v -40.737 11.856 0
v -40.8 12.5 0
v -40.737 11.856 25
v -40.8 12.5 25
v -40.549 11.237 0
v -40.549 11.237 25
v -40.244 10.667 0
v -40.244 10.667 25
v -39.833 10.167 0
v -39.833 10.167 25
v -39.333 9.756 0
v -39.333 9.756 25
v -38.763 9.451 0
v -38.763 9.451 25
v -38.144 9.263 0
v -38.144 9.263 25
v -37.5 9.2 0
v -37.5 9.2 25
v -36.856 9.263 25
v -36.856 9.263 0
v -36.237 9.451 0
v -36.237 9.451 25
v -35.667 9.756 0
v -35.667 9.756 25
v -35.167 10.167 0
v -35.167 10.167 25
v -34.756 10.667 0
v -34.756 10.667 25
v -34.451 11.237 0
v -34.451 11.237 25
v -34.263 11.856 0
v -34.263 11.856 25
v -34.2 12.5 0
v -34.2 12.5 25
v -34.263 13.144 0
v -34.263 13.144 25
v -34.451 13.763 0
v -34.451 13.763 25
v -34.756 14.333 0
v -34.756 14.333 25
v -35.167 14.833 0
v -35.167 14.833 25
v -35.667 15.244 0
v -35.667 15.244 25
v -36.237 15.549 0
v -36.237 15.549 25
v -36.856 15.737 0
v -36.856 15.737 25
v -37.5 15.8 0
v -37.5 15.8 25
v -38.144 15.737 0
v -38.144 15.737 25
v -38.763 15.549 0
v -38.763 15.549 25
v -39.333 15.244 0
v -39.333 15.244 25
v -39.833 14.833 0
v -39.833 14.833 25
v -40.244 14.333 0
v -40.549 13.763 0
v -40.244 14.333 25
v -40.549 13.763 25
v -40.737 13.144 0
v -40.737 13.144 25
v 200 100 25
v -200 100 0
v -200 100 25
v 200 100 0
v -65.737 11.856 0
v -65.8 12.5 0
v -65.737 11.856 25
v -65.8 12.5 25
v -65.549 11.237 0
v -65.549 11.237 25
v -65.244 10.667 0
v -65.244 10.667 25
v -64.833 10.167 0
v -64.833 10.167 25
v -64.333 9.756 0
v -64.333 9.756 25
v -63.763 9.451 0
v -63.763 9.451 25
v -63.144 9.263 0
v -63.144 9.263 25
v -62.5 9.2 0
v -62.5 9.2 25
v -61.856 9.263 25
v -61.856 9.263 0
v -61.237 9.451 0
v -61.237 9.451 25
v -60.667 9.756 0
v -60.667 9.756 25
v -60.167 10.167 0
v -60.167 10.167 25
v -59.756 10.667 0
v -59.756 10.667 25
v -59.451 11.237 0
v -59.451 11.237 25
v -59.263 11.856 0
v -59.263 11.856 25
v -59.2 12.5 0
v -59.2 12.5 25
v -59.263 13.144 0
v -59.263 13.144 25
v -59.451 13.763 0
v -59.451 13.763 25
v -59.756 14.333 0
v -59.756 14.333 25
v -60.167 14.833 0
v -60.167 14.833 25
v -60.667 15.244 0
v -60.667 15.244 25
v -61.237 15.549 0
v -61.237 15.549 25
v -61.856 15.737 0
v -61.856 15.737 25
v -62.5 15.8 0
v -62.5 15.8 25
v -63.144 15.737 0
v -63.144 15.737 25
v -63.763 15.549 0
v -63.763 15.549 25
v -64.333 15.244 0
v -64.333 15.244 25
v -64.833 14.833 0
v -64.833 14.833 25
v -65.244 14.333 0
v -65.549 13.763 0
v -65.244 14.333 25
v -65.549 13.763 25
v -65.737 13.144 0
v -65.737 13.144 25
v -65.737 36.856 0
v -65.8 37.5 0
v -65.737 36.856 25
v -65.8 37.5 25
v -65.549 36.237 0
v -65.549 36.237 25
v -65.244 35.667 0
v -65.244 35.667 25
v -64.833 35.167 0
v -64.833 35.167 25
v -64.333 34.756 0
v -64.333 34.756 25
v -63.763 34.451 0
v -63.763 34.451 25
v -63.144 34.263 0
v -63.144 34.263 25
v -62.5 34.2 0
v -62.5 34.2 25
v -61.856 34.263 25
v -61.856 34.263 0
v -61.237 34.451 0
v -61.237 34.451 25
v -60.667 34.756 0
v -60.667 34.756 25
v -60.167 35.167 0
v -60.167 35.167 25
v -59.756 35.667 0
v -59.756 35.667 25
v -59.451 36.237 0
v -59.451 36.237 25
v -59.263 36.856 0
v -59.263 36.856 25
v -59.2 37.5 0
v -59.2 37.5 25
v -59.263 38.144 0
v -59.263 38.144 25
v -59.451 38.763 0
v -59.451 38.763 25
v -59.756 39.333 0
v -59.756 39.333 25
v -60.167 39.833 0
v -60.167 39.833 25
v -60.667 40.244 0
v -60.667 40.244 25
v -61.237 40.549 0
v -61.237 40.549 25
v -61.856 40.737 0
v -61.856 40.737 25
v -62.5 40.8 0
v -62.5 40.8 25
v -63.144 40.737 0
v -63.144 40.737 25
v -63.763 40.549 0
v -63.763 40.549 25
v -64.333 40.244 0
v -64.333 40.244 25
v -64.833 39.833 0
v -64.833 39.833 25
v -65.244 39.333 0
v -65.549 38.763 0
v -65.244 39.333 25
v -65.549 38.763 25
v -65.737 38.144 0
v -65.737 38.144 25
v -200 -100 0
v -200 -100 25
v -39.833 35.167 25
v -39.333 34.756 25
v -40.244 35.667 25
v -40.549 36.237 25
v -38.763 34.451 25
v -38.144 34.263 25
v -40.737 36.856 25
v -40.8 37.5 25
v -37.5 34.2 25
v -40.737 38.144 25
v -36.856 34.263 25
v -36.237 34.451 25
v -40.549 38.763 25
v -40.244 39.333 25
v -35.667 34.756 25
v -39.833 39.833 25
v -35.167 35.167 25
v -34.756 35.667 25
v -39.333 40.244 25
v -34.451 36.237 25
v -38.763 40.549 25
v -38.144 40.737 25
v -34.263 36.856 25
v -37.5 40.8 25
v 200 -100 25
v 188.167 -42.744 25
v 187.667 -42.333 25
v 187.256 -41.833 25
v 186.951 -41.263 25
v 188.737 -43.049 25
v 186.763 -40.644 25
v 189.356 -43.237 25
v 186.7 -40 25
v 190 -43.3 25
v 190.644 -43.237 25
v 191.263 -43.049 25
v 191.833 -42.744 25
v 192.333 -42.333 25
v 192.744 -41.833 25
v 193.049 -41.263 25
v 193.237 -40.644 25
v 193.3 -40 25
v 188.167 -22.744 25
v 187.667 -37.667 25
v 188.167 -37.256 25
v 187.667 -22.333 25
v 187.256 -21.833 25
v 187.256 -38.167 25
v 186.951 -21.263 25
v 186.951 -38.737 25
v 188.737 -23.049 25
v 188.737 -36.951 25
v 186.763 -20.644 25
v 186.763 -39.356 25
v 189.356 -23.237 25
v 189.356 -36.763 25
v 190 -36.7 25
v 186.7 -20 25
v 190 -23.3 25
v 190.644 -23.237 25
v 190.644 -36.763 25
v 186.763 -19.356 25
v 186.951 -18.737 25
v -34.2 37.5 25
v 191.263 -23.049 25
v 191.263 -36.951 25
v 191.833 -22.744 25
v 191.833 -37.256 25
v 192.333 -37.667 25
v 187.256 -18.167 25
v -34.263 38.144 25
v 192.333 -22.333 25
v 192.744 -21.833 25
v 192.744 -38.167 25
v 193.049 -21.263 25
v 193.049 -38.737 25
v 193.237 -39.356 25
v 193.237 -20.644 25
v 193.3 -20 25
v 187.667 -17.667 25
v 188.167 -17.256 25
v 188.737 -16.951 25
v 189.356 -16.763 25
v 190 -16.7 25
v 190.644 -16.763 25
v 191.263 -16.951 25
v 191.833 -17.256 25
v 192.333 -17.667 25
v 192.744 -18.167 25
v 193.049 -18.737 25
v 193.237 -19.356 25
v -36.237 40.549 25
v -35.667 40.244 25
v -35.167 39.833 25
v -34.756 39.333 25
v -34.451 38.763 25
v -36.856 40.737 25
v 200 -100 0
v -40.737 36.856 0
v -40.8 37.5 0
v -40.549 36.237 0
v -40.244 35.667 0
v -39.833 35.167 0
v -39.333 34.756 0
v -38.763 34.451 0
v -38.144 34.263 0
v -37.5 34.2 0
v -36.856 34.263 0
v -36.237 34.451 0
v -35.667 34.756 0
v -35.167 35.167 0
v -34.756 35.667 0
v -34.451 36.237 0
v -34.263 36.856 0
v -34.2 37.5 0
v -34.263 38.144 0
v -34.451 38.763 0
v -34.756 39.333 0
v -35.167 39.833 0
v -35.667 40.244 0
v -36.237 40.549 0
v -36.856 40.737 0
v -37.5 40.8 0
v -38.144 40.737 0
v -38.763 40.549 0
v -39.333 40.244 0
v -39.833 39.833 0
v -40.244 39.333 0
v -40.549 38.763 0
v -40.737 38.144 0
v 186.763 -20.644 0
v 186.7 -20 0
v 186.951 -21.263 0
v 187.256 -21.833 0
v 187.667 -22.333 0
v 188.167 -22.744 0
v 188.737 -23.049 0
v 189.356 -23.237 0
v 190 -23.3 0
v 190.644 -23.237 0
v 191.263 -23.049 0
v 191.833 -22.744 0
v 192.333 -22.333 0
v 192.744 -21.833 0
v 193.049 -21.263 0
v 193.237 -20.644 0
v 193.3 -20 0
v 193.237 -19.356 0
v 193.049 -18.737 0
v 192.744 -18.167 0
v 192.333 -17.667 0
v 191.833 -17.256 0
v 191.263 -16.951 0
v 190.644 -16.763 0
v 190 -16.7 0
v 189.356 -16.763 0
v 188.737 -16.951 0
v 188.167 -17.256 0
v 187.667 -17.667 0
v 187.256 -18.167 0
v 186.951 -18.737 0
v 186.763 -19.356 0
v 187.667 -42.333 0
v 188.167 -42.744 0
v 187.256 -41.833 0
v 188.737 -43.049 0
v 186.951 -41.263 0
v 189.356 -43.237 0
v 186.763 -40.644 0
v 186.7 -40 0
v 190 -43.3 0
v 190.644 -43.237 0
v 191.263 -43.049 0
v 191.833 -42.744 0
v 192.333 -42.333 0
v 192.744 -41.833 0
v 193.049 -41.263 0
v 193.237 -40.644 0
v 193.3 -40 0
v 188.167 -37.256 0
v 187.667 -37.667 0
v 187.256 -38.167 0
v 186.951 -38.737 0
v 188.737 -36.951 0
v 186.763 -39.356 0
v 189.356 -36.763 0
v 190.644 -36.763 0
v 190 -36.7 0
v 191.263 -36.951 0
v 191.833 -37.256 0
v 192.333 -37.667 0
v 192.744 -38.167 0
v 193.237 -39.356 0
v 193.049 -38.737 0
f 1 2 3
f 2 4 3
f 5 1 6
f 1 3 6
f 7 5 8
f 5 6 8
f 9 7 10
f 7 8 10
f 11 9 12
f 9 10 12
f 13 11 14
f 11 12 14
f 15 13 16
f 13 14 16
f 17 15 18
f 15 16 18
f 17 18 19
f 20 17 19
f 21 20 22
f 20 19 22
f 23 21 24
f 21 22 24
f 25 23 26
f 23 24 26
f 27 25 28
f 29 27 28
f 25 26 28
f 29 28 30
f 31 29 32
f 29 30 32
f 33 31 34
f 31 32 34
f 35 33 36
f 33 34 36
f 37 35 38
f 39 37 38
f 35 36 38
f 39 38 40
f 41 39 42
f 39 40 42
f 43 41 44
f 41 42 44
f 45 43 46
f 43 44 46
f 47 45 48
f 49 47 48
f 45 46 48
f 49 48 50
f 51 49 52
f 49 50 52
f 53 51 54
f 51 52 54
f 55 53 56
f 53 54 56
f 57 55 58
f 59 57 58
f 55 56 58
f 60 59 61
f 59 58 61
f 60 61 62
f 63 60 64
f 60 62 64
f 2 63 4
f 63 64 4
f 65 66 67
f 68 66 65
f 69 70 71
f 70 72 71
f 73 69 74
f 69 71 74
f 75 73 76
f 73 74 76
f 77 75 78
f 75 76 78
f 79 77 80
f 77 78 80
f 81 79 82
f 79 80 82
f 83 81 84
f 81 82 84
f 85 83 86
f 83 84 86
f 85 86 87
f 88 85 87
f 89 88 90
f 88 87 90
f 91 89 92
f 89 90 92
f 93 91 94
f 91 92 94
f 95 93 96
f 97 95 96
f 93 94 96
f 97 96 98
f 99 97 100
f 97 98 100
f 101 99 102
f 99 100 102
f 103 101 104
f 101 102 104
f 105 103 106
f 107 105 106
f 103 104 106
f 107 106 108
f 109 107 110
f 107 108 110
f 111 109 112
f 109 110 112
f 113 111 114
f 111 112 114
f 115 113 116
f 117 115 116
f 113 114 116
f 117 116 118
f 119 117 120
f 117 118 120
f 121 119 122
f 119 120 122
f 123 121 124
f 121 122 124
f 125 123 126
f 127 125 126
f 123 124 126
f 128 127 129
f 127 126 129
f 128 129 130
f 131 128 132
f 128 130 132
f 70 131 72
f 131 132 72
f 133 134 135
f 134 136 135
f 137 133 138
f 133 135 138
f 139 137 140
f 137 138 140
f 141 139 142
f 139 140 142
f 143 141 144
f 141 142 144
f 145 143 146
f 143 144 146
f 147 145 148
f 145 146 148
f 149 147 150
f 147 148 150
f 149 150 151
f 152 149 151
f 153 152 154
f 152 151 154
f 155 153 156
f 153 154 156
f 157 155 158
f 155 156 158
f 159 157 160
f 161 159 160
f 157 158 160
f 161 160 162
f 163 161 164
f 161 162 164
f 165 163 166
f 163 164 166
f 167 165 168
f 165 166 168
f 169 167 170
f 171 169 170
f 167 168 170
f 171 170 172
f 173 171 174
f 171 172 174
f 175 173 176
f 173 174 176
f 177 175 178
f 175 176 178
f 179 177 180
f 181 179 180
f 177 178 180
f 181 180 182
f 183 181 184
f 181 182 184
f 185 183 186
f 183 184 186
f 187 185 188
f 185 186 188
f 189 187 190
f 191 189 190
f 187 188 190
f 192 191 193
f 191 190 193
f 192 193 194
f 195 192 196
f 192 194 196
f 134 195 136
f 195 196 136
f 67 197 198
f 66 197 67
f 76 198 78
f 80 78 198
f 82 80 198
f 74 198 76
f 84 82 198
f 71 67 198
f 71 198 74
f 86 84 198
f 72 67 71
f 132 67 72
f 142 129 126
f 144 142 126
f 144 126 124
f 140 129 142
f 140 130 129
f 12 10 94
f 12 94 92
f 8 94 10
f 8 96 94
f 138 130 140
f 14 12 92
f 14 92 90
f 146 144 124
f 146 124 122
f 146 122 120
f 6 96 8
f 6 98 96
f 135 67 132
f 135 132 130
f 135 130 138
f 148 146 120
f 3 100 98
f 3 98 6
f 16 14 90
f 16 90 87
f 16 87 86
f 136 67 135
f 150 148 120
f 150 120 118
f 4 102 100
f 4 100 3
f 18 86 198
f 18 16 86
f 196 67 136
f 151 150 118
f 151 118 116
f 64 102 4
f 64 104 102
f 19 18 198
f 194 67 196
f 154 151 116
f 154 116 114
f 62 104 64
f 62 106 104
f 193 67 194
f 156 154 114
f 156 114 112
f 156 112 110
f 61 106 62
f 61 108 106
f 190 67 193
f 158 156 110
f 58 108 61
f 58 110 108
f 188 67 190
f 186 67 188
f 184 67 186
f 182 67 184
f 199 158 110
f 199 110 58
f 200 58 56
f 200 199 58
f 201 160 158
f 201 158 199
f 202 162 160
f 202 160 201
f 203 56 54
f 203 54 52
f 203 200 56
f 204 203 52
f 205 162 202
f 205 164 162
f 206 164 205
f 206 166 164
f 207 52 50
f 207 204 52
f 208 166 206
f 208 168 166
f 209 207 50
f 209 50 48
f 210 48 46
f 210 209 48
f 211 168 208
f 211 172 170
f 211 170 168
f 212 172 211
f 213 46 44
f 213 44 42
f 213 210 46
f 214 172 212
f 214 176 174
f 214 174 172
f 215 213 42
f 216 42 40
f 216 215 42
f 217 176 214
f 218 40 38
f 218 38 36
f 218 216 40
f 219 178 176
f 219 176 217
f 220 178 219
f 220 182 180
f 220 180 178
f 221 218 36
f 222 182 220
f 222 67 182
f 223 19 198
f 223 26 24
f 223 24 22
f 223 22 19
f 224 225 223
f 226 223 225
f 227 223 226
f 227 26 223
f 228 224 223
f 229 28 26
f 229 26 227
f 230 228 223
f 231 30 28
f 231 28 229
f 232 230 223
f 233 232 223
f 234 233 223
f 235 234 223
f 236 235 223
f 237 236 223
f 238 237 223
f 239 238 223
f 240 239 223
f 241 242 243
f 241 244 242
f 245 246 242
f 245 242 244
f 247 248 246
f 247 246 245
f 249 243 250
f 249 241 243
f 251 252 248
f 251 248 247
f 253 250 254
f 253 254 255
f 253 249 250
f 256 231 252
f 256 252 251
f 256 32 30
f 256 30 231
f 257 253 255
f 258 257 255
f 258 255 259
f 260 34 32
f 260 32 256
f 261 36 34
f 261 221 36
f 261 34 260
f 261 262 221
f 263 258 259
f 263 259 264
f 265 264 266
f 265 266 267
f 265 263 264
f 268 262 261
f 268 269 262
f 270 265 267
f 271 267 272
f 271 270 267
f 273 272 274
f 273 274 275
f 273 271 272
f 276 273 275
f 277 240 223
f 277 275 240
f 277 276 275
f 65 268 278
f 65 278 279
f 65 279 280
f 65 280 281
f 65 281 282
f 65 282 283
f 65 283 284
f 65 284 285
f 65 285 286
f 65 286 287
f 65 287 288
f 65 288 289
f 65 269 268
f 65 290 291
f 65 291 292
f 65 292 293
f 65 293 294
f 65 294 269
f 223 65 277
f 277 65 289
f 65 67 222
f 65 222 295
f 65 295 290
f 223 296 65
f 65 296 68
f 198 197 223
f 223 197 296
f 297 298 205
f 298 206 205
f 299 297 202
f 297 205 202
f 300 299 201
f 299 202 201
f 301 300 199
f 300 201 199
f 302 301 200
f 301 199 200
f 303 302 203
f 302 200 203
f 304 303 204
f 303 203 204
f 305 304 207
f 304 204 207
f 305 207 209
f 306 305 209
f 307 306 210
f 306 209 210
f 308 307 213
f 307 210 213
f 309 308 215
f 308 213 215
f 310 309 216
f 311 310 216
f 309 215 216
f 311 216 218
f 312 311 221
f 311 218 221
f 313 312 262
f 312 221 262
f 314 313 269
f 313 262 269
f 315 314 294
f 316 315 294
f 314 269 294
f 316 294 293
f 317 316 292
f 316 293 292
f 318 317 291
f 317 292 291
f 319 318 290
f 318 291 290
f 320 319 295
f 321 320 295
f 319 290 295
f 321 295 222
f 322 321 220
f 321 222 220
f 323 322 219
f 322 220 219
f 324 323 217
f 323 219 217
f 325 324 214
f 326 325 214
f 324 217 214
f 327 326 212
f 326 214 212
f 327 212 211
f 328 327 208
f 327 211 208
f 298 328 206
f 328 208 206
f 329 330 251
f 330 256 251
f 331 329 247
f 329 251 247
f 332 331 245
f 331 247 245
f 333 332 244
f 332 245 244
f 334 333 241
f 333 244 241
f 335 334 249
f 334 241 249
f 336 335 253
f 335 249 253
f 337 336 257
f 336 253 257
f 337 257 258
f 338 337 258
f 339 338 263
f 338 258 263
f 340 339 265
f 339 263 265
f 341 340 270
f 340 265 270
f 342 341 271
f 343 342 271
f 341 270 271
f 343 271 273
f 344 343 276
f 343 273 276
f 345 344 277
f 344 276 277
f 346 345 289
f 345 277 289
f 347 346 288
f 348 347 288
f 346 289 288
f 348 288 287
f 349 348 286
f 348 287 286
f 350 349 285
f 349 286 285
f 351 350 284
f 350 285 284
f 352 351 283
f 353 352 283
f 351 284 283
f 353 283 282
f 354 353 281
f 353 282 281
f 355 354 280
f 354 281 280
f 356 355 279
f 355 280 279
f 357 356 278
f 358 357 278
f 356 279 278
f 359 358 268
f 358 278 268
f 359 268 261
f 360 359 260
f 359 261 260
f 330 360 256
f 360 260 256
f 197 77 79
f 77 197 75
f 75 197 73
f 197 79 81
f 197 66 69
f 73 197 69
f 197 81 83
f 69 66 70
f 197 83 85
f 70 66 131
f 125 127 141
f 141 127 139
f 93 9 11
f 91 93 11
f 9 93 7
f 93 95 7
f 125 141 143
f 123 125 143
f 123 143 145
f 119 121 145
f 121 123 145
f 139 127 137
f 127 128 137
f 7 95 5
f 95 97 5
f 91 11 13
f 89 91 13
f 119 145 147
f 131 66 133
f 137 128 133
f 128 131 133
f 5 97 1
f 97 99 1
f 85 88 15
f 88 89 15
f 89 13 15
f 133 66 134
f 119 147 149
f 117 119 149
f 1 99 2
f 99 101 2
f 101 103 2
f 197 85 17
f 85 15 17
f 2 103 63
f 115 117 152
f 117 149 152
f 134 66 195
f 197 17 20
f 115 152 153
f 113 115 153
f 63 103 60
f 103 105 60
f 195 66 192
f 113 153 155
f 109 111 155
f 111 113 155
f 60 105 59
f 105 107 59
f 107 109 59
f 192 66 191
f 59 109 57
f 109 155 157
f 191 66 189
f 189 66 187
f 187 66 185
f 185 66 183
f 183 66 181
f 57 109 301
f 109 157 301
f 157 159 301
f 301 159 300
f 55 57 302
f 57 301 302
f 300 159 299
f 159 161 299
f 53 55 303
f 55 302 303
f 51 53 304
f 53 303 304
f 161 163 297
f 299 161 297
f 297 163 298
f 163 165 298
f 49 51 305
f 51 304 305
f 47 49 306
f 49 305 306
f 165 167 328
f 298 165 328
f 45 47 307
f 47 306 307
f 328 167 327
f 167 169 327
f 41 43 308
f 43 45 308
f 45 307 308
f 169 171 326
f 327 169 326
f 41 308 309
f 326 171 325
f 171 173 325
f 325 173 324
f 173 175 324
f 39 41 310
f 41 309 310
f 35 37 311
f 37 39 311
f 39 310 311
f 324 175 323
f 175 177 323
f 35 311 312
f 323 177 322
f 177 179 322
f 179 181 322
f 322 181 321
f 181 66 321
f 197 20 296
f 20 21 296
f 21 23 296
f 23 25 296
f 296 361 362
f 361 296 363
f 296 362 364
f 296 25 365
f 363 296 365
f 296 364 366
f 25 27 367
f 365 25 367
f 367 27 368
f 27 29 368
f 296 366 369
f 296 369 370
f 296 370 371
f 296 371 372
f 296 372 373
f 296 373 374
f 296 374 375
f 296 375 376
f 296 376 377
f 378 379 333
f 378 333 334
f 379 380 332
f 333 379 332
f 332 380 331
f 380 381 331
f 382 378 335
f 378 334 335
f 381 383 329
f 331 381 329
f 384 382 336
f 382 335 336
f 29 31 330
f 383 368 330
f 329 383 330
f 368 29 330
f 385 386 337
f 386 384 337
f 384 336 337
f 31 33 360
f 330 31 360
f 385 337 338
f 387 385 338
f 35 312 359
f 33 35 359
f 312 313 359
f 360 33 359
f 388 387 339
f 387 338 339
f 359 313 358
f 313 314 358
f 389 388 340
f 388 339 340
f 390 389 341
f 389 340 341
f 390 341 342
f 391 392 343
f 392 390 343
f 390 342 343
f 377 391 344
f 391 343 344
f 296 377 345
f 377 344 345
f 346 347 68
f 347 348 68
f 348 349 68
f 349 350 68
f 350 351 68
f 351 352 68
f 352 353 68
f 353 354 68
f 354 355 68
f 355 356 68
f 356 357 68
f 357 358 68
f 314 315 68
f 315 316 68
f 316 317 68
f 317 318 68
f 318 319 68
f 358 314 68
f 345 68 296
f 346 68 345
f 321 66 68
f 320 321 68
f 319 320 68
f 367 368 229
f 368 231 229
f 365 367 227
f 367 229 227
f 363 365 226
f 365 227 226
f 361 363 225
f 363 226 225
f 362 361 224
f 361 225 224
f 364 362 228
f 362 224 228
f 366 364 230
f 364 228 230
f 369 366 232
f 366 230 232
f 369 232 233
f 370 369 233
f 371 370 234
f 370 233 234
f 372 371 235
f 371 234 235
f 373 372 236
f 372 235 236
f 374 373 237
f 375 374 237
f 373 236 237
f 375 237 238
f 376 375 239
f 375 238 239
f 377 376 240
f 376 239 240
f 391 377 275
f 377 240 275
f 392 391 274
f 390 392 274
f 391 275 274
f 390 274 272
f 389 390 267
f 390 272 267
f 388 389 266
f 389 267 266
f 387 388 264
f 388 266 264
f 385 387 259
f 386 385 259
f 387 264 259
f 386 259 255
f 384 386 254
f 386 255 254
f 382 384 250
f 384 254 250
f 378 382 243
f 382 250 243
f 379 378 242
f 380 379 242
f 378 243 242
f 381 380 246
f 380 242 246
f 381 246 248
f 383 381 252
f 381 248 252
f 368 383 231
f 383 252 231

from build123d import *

# Parameters (mm, degrees)
F0_W     = 400
F0_H     = 200
F0_W_2   = 25
F0_H_2   = 25
F1_DEPTH = 25
F2_D     = 6.6
F2_DEPTH = 25
F2_TIP   = 1.9828400428
F3_D     = 6.6
F3_DEPTH = 25
F3_TIP   = 1.9828400428


with BuildPart() as f1:
    # F0 (on Top) → F1 (new body)
    with BuildSketch(Plane.XY):
        Rectangle(F0_W, F0_H)
        with Locations((-50, 25)):
            Rectangle(F0_W_2, F0_H_2, mode=Mode.SUBTRACT)
        with Locations((-50, 25)):
            Rectangle(F0_W_2, F0_H_2)
    extrude(amount=F1_DEPTH)

    # F2
    with Locations(Plane(origin=(0, 0, 0), x_dir=(1, 0, 0), z_dir=(0, 0, -1))):
        with Locations((-62.5, -37.5), (-37.5, -12.5), (-37.5, -37.5), (-62.5, -12.5)):
            Hole(F2_D / 2, depth=F2_DEPTH)
            with Locations((0, 0, -(F2_DEPTH + F2_TIP / 2))):  # 118° drill point
                Cone(0, F2_D / 2, F2_TIP, mode=Mode.SUBTRACT)

    # F3
    with Locations(Plane(origin=(0, 0, 0), x_dir=(1, 0, 0), z_dir=(0, 0, -1))):
        with Locations((190, 20), (190, 40)):
            Hole(F3_D / 2, depth=F3_DEPTH)
            with Locations((0, 0, -(F3_DEPTH + F3_TIP / 2))):  # 118° drill point
                Cone(0, F3_D / 2, F3_TIP, mode=Mode.SUBTRACT)


solid = f1.part
